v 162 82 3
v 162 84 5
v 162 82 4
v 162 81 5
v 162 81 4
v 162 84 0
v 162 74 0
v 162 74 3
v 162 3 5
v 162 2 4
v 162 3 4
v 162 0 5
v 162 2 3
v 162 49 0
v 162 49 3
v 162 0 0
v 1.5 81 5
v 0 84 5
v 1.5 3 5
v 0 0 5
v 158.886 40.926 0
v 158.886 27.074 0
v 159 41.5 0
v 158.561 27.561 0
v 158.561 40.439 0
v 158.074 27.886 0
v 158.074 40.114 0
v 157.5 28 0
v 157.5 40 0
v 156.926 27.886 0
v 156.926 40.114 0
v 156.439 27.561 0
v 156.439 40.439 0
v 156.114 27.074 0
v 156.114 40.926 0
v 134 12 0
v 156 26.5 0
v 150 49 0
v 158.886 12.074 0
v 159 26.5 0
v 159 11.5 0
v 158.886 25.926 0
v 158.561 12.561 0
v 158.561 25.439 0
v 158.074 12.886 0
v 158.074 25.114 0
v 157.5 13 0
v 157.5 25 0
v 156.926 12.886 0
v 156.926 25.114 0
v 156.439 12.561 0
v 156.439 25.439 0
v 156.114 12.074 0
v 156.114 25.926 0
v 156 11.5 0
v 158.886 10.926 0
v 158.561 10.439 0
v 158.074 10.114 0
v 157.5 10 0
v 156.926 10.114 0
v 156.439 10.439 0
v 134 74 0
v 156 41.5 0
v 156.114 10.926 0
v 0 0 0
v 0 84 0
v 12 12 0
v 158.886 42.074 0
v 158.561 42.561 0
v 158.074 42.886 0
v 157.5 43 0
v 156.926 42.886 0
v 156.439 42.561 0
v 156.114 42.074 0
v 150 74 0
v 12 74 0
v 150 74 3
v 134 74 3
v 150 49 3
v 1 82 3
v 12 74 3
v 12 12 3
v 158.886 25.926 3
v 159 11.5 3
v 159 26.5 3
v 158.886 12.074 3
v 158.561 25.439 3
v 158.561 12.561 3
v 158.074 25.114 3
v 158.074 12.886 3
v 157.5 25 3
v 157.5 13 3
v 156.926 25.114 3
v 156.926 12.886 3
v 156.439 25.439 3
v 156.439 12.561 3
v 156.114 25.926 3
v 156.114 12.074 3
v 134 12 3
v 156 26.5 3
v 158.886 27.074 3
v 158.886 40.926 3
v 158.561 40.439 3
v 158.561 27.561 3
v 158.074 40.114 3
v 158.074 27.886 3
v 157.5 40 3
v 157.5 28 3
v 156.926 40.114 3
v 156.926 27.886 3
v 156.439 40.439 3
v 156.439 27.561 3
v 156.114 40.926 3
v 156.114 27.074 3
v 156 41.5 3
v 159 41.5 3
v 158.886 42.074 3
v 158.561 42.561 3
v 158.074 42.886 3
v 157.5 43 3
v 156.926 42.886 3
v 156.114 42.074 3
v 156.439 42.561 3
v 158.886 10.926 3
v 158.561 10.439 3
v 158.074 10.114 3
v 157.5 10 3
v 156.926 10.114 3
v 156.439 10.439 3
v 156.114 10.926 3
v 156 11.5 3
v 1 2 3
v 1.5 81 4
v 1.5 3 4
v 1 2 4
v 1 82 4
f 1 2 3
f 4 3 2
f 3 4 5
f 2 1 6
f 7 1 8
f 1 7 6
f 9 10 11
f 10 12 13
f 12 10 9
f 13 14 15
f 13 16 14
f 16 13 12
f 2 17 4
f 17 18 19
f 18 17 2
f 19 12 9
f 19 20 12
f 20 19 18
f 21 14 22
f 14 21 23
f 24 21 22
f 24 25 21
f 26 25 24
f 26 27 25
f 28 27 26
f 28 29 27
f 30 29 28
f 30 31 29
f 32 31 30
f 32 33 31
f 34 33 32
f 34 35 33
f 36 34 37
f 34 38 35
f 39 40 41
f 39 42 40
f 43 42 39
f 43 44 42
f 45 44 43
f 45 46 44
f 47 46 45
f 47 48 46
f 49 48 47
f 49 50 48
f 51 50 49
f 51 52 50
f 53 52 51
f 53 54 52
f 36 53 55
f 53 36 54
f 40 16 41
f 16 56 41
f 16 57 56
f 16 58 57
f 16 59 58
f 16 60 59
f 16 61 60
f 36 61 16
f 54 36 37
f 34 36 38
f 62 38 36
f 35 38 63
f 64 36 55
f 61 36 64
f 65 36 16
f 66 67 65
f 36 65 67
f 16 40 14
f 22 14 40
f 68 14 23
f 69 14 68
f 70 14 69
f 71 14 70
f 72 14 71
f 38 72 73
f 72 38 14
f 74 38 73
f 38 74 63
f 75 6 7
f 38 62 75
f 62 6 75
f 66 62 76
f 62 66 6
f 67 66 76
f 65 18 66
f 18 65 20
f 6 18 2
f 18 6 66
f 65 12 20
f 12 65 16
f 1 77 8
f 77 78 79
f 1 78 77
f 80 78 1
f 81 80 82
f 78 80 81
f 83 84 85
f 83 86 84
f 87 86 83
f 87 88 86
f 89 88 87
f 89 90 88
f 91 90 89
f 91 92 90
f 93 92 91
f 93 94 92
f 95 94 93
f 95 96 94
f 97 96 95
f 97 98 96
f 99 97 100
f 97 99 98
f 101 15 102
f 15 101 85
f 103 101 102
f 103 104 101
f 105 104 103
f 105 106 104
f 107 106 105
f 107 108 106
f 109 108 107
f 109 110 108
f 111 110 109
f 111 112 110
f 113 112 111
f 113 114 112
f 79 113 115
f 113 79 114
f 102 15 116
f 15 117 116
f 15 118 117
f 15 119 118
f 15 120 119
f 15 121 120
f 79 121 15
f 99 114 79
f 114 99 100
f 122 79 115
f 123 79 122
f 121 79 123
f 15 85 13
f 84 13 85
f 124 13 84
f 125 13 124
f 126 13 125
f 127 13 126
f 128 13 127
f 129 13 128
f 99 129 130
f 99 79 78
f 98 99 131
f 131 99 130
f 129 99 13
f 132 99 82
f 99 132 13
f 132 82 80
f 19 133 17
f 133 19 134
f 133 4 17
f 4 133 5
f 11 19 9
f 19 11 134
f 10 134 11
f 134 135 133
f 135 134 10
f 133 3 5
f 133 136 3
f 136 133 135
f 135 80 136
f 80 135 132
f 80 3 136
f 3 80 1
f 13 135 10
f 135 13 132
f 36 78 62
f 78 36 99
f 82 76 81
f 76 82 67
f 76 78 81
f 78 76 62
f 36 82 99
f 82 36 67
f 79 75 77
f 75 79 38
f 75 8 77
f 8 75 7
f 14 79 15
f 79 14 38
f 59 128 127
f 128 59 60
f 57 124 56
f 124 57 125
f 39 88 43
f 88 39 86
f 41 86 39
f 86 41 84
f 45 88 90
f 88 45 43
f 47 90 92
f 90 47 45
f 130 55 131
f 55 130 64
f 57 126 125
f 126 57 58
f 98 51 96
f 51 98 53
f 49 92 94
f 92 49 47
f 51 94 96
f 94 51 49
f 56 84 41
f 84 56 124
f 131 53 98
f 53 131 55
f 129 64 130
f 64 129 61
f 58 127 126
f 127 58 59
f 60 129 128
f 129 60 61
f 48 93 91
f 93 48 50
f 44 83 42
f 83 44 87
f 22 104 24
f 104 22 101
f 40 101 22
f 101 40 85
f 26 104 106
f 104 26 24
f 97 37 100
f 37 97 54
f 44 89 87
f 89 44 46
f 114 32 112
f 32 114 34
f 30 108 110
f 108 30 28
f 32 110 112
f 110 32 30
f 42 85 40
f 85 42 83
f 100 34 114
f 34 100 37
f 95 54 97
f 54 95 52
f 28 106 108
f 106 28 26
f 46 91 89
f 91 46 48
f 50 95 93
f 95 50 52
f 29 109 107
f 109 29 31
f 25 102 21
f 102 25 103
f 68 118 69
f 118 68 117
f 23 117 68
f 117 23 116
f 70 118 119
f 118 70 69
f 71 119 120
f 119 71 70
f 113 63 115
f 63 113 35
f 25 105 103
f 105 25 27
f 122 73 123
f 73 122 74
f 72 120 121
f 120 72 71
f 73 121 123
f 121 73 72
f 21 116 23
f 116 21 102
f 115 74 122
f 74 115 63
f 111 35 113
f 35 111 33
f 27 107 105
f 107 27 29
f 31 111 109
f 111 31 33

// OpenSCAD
difference() {
    translate([81,42,2.5])
    cube([162,84,5], center=true);
    
    translate([3,3,3])
    translate([79,39,1.5]) cube([161,78,3], center=true);
    
    translate([2,2,3])
    translate([80,40,.5]) cube([162,80,1], center=true);
    
    translate([12,12,-.5])
    translate([61,31,2.5]) cube([122,62,5], center=true);

    translate([150,49,-.5])
    translate([7.5,12.5,2.5]) cube([15,25,5], center=true);
    
    $fn=16;
    translate([156, 10, 0])
        translate([1.5,1.5,-1]) cylinder(r=1.5,h=10);
    translate([156, 10, 0])
        translate([0,15,0])
        translate([1.5,1.5,-1]) cylinder(r=1.5,h=10);
    translate([156, 10, 0])
        translate([0,30,0])
        translate([1.5,1.5,-1]) cylinder(r=1.5,h=10);      
 }
